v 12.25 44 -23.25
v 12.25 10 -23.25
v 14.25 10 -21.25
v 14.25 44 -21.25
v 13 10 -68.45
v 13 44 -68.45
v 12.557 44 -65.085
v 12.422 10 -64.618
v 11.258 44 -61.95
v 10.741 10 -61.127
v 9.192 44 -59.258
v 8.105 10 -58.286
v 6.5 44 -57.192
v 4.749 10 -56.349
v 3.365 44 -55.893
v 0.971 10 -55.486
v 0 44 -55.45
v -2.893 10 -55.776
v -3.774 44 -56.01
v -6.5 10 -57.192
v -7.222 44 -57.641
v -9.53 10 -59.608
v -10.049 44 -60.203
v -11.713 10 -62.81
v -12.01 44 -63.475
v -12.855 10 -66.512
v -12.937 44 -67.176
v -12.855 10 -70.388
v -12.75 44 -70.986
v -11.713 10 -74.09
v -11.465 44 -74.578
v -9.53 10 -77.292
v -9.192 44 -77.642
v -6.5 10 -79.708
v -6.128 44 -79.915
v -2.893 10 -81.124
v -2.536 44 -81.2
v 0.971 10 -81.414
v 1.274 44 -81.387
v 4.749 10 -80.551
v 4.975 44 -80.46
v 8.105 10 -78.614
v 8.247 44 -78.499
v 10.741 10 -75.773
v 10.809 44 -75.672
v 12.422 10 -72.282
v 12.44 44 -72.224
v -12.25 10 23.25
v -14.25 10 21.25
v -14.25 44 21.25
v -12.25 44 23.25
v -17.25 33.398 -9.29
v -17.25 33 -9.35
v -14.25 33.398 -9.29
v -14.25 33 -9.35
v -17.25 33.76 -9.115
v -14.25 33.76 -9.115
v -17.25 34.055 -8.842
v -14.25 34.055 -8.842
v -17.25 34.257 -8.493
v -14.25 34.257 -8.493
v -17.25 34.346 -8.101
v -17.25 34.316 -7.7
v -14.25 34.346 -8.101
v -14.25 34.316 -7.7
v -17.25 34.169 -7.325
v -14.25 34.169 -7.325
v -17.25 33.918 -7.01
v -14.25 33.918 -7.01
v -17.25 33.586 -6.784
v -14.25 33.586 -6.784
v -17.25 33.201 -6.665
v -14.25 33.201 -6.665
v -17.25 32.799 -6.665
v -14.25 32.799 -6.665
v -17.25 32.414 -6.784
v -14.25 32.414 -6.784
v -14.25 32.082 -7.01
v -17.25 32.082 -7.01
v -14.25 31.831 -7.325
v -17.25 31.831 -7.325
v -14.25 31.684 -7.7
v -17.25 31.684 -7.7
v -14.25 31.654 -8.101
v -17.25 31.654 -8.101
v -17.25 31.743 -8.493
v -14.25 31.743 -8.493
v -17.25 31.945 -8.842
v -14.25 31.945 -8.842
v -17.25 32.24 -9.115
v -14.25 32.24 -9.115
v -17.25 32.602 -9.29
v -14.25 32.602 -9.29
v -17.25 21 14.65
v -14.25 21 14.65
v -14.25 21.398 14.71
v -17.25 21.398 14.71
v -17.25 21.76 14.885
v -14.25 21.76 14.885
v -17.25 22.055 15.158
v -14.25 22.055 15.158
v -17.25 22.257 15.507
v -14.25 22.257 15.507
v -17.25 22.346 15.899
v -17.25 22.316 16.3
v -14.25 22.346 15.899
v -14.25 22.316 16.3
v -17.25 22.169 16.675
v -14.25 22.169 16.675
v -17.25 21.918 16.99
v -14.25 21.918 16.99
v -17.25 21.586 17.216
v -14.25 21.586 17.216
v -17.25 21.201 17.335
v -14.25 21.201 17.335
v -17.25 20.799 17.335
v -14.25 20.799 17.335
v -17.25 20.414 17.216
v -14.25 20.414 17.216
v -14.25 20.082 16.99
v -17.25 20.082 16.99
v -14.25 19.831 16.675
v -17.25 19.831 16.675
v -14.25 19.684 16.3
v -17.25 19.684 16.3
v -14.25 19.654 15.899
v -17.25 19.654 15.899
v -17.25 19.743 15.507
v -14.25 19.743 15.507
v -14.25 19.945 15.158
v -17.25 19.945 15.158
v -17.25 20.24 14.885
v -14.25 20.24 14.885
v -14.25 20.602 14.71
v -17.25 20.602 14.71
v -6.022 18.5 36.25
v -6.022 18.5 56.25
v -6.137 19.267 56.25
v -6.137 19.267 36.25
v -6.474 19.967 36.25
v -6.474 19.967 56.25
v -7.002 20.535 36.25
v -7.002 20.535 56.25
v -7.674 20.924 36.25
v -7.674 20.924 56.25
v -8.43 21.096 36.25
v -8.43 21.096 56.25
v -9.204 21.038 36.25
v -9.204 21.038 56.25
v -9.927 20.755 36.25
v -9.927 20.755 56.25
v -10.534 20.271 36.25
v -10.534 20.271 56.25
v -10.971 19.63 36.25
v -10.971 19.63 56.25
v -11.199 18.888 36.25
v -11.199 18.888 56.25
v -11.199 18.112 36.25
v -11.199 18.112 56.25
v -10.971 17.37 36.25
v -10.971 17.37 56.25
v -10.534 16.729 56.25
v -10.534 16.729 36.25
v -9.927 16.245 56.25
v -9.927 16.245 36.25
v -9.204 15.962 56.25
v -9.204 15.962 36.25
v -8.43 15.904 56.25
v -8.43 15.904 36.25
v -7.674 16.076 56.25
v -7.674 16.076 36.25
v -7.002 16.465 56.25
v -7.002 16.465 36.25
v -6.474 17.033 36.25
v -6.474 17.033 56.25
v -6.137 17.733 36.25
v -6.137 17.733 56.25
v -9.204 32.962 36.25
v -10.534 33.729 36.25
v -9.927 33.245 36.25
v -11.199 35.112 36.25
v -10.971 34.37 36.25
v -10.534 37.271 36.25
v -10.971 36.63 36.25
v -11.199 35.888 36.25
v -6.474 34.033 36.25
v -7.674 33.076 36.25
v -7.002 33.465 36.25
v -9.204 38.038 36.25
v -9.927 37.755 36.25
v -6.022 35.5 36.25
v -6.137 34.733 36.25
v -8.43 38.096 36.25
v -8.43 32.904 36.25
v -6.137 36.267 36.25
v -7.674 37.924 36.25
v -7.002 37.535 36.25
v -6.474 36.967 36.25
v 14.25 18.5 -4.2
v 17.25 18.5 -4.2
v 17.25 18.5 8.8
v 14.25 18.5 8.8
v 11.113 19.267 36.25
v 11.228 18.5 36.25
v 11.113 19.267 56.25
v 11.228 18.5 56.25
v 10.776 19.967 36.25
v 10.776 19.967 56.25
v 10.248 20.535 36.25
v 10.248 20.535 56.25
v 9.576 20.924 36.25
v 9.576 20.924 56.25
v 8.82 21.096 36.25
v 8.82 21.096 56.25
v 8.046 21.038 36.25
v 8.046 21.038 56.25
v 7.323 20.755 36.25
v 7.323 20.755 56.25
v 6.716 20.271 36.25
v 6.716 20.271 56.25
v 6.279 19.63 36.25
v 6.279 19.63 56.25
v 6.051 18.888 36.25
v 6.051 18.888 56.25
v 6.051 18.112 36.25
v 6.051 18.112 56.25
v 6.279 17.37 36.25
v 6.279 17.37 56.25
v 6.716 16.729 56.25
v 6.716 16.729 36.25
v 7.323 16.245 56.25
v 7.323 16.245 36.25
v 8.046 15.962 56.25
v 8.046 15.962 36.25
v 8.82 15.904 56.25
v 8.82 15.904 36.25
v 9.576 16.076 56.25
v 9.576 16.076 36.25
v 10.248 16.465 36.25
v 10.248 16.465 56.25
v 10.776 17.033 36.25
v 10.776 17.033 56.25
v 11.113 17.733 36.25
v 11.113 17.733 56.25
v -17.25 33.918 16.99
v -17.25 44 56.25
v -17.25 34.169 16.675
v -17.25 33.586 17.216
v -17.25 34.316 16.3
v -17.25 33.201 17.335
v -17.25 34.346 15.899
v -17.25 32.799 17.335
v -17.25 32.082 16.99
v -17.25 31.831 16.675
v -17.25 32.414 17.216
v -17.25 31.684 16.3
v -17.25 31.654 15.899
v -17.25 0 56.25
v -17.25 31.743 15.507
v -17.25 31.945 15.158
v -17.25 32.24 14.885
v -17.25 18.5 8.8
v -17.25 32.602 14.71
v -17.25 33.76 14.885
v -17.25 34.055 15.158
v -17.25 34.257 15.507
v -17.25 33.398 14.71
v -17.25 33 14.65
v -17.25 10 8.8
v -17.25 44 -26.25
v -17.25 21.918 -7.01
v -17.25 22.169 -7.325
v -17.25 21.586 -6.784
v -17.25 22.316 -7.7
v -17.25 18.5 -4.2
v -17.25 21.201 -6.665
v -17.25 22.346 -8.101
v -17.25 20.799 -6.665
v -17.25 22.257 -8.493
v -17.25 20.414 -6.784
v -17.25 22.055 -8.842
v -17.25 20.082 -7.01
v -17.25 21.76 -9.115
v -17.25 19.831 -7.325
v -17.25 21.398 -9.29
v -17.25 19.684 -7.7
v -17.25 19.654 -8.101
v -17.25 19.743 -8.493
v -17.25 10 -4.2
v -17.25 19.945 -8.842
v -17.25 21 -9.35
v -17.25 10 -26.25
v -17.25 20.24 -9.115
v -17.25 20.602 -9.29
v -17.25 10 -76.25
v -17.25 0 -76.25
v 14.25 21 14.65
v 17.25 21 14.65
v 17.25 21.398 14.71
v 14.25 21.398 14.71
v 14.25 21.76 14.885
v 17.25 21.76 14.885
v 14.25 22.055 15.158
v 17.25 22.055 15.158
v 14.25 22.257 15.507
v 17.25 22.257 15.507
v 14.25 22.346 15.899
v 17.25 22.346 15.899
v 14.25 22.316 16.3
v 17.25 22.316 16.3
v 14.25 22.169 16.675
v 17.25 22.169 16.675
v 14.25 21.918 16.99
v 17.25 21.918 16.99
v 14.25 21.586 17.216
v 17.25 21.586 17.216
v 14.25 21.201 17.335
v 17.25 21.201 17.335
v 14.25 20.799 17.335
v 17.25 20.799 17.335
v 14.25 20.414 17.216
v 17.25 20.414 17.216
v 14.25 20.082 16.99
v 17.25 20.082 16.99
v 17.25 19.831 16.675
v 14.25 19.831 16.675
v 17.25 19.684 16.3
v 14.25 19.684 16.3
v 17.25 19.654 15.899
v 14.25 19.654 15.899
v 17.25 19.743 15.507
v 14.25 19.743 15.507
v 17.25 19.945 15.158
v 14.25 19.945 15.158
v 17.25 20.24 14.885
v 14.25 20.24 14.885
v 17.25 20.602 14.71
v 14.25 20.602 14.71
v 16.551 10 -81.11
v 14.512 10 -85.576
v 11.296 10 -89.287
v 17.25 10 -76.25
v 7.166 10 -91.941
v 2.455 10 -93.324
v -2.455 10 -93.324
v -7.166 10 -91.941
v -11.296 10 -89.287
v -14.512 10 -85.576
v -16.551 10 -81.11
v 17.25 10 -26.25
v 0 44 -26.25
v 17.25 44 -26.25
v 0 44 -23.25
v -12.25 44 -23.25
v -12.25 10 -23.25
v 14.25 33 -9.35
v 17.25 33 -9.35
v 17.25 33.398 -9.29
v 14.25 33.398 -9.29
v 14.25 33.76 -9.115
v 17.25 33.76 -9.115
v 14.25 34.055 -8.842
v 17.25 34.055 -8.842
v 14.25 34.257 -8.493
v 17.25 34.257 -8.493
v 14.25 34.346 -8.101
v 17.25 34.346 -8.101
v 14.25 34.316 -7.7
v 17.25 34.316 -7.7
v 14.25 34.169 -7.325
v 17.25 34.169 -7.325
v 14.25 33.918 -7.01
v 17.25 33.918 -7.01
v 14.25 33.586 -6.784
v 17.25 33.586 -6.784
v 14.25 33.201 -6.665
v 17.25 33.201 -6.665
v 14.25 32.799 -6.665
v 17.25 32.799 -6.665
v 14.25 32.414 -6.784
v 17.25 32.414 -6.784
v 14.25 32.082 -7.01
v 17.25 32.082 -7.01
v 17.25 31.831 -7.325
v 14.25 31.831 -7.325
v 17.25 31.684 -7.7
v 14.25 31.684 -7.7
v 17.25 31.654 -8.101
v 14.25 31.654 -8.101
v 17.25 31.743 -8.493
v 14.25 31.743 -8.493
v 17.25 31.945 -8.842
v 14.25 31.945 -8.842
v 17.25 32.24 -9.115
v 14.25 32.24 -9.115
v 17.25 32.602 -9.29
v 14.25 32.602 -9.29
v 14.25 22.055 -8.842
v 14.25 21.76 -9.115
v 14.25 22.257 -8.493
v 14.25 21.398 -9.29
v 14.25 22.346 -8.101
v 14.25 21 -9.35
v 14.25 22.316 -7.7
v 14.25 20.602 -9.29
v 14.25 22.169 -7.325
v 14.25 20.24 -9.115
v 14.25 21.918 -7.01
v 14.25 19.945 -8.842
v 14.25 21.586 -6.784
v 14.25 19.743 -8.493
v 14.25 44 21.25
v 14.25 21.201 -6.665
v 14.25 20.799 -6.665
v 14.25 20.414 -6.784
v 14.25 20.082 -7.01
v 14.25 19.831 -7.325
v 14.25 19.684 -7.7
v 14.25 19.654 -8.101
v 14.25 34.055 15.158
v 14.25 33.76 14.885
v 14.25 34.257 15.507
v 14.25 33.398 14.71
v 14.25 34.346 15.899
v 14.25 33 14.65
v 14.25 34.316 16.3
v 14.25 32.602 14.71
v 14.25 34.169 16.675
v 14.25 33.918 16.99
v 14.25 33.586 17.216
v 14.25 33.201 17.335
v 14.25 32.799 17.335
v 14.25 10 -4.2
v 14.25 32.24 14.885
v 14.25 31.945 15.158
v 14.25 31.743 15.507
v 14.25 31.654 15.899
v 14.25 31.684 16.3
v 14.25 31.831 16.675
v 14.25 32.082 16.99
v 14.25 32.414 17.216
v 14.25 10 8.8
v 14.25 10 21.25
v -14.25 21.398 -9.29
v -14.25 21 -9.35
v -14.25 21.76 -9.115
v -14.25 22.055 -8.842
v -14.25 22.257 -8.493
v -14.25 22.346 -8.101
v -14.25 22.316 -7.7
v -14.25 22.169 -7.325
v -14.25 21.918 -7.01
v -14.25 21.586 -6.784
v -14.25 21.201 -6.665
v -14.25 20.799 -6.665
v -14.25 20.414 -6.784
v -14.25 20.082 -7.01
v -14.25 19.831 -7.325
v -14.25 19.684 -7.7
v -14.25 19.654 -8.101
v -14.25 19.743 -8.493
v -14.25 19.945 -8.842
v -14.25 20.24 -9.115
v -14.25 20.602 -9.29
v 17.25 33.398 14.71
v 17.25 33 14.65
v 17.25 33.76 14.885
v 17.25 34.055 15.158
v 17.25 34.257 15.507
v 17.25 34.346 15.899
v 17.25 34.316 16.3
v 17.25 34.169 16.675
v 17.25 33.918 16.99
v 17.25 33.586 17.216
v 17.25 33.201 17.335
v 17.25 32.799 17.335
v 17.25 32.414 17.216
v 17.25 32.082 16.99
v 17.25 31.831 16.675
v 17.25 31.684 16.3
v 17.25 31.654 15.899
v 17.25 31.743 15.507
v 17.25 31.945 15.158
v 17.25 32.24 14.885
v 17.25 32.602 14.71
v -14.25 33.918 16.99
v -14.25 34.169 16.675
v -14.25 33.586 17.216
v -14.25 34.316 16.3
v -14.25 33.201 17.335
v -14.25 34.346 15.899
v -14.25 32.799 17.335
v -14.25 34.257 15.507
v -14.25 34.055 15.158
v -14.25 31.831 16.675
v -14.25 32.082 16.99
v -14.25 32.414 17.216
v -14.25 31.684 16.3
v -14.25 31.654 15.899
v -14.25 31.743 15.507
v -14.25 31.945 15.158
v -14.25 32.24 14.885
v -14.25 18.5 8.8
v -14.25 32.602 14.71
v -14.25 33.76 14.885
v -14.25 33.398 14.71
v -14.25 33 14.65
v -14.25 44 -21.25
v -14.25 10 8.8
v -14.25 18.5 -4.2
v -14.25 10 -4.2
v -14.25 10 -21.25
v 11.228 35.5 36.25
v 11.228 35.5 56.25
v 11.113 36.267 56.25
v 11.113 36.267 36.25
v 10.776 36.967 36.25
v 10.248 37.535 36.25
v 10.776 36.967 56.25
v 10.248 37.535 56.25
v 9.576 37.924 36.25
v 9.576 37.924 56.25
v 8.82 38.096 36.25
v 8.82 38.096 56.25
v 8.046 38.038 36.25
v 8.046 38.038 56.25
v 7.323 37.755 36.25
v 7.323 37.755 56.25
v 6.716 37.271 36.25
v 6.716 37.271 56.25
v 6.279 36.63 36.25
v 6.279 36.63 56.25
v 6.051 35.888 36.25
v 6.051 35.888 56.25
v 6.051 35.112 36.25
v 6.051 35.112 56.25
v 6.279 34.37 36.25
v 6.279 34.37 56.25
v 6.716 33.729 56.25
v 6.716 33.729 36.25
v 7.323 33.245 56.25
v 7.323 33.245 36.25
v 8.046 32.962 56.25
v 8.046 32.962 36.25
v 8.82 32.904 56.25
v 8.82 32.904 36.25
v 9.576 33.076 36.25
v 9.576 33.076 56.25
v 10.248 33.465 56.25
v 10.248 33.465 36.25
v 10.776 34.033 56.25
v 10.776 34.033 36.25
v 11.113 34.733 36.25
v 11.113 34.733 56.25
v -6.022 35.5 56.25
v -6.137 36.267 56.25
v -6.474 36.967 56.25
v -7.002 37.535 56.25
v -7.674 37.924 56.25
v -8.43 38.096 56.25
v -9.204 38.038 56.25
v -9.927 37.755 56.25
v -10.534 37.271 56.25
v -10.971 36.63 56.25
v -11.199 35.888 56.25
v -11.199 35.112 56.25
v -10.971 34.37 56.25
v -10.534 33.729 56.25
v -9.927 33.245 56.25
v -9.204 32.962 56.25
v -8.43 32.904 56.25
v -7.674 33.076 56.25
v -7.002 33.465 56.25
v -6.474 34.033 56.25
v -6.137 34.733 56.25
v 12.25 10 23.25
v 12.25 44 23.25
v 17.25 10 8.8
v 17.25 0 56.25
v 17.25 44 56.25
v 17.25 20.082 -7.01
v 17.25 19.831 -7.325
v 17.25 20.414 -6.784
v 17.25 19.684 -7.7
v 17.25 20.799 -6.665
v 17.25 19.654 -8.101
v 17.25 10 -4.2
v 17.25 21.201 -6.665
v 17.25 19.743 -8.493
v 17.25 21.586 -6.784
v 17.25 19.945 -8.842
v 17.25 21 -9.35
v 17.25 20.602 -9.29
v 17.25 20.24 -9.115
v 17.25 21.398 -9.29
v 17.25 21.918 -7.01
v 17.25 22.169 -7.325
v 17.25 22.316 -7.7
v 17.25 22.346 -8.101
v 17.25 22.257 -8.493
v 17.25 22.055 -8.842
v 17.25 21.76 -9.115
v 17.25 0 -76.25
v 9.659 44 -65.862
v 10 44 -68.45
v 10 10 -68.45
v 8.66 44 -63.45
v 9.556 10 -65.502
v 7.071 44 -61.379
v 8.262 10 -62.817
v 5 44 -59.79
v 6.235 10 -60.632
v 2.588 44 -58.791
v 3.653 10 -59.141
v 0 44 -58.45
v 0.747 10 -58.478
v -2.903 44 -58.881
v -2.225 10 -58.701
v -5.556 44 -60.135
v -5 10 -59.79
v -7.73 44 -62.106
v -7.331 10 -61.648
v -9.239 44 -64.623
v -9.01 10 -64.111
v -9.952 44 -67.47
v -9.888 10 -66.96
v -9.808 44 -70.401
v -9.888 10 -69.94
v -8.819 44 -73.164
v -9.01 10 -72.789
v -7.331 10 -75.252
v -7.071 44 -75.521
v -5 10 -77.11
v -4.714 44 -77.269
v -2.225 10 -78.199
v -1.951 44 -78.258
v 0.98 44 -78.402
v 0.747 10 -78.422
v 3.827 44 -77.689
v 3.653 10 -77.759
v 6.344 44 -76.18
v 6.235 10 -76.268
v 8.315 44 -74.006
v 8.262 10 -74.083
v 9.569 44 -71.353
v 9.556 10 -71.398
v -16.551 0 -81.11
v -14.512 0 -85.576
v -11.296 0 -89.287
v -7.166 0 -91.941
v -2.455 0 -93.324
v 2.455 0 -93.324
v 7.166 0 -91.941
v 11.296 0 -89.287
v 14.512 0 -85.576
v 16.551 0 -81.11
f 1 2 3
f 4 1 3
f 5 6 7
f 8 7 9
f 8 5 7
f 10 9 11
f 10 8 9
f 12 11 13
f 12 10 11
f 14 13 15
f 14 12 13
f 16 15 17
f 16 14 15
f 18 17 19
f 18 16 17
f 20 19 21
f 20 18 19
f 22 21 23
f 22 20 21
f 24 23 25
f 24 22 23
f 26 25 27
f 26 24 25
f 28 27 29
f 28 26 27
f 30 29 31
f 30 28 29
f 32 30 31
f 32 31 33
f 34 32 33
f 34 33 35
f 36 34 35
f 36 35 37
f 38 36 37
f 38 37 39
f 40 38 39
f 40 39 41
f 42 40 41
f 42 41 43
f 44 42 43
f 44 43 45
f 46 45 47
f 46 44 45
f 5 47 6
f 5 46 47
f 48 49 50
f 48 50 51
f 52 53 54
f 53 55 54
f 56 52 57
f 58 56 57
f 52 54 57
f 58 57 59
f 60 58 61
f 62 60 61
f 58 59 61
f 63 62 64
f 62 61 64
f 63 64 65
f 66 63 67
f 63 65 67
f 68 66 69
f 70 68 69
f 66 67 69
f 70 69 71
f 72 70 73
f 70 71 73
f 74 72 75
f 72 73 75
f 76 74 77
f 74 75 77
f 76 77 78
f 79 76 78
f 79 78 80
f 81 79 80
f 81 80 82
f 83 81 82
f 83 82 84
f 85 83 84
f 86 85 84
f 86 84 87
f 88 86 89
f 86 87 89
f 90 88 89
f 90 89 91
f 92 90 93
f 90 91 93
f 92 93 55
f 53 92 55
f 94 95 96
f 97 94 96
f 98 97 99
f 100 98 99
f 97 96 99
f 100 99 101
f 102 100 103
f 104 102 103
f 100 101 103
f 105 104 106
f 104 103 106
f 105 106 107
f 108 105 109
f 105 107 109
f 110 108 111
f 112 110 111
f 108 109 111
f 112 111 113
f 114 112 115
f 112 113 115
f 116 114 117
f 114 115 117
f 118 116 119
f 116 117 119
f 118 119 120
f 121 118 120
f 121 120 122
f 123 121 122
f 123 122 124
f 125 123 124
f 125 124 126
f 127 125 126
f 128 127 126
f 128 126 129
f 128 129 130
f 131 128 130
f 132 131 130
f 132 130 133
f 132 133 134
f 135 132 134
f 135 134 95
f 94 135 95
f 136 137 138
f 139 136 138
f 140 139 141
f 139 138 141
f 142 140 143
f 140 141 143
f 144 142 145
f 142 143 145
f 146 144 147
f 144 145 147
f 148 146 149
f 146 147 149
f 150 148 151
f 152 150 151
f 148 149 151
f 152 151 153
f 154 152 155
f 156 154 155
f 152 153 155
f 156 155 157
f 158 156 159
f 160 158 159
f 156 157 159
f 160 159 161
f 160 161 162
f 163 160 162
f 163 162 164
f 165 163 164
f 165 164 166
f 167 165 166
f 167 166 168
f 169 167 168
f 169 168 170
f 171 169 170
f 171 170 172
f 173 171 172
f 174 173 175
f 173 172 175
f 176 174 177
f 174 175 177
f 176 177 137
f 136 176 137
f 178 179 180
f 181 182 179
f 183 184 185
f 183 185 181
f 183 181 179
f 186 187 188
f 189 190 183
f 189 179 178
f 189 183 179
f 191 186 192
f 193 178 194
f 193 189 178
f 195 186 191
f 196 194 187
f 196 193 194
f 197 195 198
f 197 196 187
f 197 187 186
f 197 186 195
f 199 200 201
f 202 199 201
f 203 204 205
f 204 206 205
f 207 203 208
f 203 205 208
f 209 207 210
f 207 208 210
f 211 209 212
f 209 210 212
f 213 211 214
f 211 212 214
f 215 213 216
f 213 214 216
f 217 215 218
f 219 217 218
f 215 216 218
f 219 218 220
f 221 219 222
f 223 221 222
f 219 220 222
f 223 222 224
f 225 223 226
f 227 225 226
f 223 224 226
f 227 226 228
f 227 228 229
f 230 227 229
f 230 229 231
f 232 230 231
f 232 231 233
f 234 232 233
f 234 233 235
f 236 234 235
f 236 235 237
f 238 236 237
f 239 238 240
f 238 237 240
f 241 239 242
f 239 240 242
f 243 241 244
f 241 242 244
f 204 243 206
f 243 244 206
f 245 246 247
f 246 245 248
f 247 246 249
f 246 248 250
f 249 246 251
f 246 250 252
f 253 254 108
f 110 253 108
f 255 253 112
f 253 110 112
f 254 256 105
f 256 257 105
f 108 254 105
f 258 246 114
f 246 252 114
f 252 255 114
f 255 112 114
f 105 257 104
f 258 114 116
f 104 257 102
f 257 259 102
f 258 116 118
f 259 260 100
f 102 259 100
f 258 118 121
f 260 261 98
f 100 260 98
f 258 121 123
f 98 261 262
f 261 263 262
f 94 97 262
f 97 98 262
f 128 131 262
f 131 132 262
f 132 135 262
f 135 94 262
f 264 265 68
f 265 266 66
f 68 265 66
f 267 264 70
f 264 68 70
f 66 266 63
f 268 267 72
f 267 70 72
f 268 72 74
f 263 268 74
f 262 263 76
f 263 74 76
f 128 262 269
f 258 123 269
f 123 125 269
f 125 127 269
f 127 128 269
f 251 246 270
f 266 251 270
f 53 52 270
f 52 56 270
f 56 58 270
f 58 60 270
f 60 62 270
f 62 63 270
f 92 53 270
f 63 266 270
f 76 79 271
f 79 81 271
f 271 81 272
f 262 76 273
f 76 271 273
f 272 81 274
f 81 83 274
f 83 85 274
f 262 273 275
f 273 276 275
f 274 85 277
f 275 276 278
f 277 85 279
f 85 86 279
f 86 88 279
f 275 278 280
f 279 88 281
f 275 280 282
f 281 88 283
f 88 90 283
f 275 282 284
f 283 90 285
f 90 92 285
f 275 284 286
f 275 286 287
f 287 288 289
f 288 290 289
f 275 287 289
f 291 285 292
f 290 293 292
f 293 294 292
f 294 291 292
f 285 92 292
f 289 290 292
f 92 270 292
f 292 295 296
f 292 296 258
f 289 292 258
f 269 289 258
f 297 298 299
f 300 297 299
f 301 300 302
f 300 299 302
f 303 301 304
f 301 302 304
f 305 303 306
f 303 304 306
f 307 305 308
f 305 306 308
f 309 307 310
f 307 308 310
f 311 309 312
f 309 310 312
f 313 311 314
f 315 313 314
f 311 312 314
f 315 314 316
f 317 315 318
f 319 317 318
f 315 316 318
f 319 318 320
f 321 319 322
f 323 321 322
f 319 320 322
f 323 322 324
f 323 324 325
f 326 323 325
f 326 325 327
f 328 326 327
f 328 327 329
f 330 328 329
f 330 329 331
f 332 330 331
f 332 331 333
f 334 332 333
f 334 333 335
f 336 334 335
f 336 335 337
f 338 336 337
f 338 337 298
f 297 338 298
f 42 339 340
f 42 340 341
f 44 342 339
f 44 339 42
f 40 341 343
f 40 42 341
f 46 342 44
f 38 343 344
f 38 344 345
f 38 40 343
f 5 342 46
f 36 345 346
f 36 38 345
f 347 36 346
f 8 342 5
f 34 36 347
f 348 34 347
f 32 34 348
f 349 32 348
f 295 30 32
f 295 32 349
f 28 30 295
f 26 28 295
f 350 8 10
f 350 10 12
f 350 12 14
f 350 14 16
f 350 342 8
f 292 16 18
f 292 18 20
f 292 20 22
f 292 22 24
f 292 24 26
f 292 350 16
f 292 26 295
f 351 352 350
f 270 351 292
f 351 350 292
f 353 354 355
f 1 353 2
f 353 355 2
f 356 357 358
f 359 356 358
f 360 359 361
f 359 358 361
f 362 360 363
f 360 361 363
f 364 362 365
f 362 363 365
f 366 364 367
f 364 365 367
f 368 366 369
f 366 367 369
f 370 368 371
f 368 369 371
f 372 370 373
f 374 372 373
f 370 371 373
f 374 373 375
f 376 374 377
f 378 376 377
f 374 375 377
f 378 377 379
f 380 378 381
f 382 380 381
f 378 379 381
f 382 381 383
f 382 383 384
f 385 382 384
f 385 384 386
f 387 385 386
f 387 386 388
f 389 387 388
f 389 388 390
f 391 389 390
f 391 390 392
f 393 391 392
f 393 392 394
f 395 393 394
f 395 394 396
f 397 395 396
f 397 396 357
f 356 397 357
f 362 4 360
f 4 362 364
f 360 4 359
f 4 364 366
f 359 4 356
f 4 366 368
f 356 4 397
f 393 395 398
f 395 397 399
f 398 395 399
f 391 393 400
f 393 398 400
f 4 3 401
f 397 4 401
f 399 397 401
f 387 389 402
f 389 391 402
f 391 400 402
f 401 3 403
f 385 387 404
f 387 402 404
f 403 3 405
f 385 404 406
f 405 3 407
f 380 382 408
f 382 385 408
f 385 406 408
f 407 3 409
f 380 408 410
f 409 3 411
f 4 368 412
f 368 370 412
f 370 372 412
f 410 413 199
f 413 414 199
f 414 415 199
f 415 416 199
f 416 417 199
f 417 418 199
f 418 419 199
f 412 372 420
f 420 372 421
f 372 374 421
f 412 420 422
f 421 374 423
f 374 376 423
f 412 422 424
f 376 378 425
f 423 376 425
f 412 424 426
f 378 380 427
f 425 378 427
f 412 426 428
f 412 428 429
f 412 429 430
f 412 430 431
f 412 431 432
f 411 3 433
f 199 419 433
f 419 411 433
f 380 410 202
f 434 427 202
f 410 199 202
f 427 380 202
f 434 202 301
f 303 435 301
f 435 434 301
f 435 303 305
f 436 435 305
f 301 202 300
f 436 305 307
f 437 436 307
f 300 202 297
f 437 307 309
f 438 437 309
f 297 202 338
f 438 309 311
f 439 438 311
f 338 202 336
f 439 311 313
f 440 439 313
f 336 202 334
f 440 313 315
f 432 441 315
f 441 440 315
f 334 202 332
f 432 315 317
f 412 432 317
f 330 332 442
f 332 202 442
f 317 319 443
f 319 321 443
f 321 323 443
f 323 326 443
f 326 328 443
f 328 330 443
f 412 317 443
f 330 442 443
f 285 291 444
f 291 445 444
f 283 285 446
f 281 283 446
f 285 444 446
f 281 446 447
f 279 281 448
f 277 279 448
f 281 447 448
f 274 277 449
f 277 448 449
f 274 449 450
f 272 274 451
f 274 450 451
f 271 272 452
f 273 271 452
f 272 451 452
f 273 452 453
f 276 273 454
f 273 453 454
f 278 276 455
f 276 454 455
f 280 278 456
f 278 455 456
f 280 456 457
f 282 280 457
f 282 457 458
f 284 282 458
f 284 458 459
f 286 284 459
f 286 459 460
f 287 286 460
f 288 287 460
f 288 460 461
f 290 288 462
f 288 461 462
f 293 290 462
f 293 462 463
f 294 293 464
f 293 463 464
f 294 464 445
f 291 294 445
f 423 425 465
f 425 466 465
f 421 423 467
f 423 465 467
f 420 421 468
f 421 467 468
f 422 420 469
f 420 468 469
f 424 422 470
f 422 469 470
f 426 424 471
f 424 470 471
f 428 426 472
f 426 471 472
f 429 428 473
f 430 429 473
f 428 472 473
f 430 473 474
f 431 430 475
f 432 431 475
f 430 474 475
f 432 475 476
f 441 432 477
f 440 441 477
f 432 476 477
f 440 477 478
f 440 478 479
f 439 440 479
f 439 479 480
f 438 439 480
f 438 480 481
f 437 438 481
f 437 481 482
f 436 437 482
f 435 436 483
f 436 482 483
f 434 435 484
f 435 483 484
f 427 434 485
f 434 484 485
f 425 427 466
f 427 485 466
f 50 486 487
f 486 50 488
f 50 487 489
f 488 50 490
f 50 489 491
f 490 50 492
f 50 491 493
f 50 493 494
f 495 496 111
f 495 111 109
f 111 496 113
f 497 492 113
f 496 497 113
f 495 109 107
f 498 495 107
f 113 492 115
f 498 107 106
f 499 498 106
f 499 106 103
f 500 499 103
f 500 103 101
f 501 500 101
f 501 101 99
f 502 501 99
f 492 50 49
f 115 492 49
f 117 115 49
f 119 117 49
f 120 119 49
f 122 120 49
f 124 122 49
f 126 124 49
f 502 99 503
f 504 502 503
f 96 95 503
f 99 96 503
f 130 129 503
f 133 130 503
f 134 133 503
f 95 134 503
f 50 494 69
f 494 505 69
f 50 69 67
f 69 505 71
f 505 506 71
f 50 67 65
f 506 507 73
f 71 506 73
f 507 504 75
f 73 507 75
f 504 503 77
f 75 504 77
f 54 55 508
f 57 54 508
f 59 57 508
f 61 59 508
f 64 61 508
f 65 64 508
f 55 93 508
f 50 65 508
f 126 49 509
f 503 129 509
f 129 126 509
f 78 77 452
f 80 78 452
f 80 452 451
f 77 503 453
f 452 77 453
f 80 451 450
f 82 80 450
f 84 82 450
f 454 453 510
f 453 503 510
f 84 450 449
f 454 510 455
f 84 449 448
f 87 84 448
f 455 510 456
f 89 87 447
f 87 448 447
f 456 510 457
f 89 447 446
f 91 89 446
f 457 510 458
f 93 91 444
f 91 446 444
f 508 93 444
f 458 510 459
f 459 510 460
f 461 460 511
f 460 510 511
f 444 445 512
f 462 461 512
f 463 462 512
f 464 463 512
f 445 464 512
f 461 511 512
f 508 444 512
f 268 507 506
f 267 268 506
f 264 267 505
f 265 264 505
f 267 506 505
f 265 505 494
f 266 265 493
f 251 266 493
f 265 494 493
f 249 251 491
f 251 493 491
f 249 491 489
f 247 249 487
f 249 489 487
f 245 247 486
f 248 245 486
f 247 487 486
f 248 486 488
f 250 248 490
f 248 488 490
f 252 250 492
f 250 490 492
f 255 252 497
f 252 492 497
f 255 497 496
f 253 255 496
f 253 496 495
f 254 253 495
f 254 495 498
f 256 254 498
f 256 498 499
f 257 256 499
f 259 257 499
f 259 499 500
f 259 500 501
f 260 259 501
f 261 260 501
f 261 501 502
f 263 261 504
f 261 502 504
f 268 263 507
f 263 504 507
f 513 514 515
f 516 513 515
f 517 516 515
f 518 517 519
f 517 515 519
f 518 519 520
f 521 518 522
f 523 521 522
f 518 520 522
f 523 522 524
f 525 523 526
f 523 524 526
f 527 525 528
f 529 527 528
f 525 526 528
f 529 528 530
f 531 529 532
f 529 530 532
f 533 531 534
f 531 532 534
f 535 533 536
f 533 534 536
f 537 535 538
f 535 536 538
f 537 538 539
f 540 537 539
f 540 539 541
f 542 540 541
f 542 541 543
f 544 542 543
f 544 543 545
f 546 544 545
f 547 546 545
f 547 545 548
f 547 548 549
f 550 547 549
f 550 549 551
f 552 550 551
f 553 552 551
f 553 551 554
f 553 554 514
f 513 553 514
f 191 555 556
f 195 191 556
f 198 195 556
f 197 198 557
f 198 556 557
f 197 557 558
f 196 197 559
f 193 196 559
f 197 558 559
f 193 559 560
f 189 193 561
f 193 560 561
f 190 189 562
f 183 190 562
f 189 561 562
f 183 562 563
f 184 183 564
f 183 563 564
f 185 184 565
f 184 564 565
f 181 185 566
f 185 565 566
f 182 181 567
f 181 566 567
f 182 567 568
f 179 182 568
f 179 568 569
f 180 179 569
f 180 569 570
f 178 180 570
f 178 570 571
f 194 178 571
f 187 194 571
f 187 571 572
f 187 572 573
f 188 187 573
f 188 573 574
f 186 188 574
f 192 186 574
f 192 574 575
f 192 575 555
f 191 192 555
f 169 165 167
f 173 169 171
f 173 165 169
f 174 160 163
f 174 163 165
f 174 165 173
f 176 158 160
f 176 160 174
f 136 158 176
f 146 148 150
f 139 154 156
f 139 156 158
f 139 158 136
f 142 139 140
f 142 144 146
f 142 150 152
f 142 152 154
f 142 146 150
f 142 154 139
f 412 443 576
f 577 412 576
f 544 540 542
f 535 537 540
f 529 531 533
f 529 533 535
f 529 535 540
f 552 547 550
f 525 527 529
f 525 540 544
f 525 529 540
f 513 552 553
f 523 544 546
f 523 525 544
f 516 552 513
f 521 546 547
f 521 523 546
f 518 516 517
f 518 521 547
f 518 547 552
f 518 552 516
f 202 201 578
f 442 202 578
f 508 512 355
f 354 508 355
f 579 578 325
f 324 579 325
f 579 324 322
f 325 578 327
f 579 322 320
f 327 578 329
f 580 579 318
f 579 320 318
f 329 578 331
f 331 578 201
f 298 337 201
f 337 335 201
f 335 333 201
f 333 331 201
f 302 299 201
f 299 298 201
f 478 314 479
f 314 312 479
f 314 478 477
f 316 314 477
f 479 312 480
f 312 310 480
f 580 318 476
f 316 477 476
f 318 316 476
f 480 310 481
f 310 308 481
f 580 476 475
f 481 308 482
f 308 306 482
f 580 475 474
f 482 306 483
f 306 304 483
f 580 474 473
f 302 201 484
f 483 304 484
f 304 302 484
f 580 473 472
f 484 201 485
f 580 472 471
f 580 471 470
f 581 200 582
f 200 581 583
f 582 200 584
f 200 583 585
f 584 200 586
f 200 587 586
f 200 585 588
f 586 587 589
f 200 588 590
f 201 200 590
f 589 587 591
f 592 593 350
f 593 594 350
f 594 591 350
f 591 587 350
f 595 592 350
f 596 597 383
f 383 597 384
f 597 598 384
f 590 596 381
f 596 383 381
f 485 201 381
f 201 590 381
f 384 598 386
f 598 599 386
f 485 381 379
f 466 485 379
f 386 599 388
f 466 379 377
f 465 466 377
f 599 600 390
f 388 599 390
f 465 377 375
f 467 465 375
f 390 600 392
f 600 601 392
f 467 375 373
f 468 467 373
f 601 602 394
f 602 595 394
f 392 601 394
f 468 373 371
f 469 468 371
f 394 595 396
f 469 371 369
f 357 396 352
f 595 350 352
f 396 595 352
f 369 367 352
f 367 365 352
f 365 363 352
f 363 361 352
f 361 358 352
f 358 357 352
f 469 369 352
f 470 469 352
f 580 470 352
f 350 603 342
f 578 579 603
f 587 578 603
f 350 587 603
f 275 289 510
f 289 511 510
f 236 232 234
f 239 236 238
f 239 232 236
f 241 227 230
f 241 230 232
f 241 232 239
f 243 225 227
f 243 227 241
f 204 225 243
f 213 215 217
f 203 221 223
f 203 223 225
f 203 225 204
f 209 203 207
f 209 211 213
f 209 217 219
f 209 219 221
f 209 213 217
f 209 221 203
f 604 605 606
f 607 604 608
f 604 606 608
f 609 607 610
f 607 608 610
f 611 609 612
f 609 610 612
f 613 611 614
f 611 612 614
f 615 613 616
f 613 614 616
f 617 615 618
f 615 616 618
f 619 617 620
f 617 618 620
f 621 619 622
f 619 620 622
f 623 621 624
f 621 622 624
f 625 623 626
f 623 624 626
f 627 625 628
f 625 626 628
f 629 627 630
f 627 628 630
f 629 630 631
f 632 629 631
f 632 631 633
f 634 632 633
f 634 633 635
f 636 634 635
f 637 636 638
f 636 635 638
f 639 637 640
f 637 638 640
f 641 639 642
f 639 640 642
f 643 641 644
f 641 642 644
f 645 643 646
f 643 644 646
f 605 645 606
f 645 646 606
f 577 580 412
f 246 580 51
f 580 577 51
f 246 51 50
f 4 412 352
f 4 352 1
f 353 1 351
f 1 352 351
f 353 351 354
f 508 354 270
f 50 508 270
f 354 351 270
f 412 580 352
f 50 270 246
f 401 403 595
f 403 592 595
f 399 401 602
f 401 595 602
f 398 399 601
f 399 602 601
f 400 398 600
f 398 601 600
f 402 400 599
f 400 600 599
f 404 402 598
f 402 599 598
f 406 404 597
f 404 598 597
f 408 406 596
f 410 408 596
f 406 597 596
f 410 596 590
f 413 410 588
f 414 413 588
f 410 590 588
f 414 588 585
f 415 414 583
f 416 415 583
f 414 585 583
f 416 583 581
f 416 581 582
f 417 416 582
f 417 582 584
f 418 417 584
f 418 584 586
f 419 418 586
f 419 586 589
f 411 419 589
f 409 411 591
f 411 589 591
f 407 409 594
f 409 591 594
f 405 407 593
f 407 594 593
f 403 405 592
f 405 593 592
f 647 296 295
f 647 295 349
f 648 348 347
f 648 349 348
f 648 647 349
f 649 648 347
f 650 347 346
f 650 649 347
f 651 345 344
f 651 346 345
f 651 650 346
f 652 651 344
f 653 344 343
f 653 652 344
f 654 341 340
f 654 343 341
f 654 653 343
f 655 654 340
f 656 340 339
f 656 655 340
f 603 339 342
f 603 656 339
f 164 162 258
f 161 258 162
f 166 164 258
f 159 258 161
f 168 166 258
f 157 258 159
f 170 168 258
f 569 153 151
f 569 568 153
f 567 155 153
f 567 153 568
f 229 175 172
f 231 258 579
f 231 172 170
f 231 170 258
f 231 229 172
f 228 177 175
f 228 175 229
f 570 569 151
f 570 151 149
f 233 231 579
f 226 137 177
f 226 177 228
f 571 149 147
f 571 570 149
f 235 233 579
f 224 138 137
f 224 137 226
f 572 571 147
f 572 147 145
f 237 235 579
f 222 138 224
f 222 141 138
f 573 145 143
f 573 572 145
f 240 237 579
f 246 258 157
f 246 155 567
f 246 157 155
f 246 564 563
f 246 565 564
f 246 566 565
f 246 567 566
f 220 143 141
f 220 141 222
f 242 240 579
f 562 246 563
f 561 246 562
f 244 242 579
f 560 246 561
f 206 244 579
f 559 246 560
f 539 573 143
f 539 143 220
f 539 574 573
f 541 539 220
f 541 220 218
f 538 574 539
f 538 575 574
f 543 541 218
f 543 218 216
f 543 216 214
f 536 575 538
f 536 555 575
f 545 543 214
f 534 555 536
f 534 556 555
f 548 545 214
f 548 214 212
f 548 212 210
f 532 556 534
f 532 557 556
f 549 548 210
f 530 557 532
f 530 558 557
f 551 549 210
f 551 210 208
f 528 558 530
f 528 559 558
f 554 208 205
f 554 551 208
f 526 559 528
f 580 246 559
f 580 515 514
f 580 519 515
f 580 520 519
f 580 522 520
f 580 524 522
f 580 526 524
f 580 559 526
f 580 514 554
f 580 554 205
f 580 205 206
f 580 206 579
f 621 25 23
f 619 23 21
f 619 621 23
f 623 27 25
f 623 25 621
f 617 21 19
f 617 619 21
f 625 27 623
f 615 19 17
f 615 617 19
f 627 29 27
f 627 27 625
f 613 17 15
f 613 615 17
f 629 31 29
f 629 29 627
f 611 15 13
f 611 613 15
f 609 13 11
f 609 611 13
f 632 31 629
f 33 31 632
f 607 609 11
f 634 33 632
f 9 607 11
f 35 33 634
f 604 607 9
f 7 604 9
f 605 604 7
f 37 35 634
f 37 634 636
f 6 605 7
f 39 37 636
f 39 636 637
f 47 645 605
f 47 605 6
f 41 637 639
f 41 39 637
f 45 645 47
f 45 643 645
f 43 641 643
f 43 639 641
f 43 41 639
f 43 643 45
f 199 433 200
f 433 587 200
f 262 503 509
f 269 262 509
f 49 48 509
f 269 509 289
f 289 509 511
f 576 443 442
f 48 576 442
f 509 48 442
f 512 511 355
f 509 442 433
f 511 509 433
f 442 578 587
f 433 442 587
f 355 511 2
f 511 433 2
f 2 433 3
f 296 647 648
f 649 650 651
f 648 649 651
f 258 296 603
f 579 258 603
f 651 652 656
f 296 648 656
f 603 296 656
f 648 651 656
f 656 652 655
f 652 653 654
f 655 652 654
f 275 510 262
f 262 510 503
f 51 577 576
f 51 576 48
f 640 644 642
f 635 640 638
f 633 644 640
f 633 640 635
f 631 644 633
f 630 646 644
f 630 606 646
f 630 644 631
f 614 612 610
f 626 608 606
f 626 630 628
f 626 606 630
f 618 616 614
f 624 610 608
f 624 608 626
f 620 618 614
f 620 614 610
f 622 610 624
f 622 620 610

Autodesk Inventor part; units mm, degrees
ref_plane "YZ Plane" through (0, 0, 0) normal (1, 0, 0) x (0, 1, 0)
ref_plane "XZ Plane" through (0, 0, 0) normal (0, 1, 0) x (-1, 0, 0)
ref_plane "XY Plane" through (0, 0, 0) normal (0, 0, 1) x (1, 0, 0)
sketch "Sketch1" plane through (0, 0, 0) normal (0, 1, 0) x (-1, 0, 0)
  line L0 (-17.25, 26.25) -> (17.25, 26.25)
  line L1 (17.25, 26.25) -> (17.25, -26.25)
  line L2 (17.25, -26.25) -> (-17.25, -26.25)
  line L3 (-17.25, -26.25) -> (-17.25, 26.25)
  line L4 (-17.25, 26.25) -> (17.25, -26.25) construction
  line L5 (17.25, 26.25) -> (-17.25, -26.25) construction
  line L6 (17.25, -26.25) -> (-17.25, -26.25)
  line L7 (-17.25, -26.25) -> (-17.25, -76.25)
  line L8 (-17.25, -76.25) -> (17.25, -76.25)
  line L9 (17.25, -76.25) -> (17.25, -26.25)
  arc A0 (-17.25, -76.25) -> (17.25, -76.25) centre (0, -76.25) ccw
  point P0 (0, 0)
  dimension "d0" = 34.5
  dimension "d1" = 52.5
  dimension "d4" = 50
extrude "Floor" add sketch "Sketch1" along normal blind 10
sketch "Sketch3" plane through (0, 10, 0) normal (0, 1, 0) x (1, 0, 0)
  arc A0 (17.25, 76.25) -> (-17.25, 76.25) centre (0, 76.25) ccw
  circle A1 centre (0, 68.45) radius 10
  circle A2 centre (0, 68.45) radius 13
  line L0 (14.25, -23.25) -> (-14.25, -23.25)
  line L1 (-14.25, -23.25) -> (-14.25, 23.25)
  line L2 (-14.25, 23.25) -> (14.25, 23.25)
  line L3 (14.25, 23.25) -> (14.25, -23.25)
  line L4 (14.25, -23.25) -> (-14.25, 23.25) construction
  line L5 (-14.25, -23.25) -> (14.25, 23.25) construction
  line L6 (17.25, 26.25) -> (-17.25, 26.25)
  line L7 (-17.25, 26.25) -> (-17.25, -26.25)
  line L8 (-17.25, -26.25) -> (17.25, -26.25)
  line L9 (17.25, -26.25) -> (17.25, 26.25)
  line L10 (17.25, 26.25) -> (-17.25, -26.25) construction
  line L11 (-17.25, 26.25) -> (17.25, -26.25) construction
  line L12 (0, 23.25) -> (0, 68.45)
  point P0 (0, 0)
  dimension "d14" = 20
  dimension "d18" = 28.5
  dimension "d19" = 46.5
  dimension "d38" = 45.2
  dimension "d54" = 26
extrude "Slots" add sketch "Sketch3" along normal blind 34
sketch "Sketch4" plane through (17.25, 0, 26.25) normal (1, 0, 0) x (0, 0, -1)
  line L0 (3, 10) -> (49.5, 10)
  line L1 (49.5, 10) -> (49.5, 44)
  line L2 (49.5, 44) -> (3, 44)
  line L3 (3, 44) -> (3, 10)
  line L4 (26.25, 10) -> (38.25, 10)
  line L5 (3, 10) -> (49.5, 10) projected
  line L6 (38.25, 10) -> (14.25, 10)
  line L7 (10.25, 33) -> (34.25, 33)
  line L8 (34.25, 33) -> (34.25, 21)
  line L9 (34.25, 21) -> (10.25, 21)
  line L10 (10.25, 21) -> (10.25, 33)
  line L11 (10.25, 33) -> (34.25, 21) construction
  line L12 (34.25, 33) -> (10.25, 21) construction
  circle A0 centre (10.25, 33) radius 1.35
  circle A1 centre (34.25, 33) radius 1.35
  circle A2 centre (34.25, 21) radius 1.35
  circle A3 centre (10.25, 21) radius 1.35
  line L13 (49.5, 10) -> (49.5, 44) projected
  line L14 (49.5, 27) -> (34.25, 27)
  line L15 (34.25, 27) -> (22.25, 27)
  point P0 (26.25, 0)
  point P1 (22.25, 27)
  dimension "d0" = 34.5
  dimension "d24" = 12
  dimension "d25" = 24
  dimension "d26" = 2.7
  dimension "d27" = 2.7
  dimension "d28" = 2.7
  dimension "d29" = 2.7
  dimension "d56" = 15.25
  dimension "d57" = 12
extrude "Screws/Sides" cut sketch "Sketch4" against normal through all contours A1 L7 L8 | L8 L7 A1 | A2 L9 L8 | L8 L9 A2 | A0 L10 L7 | L7 L10 A0 | A3 L10 L9 | L9 L10 A3
sketch "Sketch5" plane through (0, 44, 0) normal (0, 1, 0) x (1, 0, 0)
  line L0 (14.25, -21.25) -> (-14.25, -21.25)
  line L1 (-14.25, -21.25) -> (-14.25, 21.25)
  line L2 (-14.25, 21.25) -> (14.25, 21.25)
  line L3 (14.25, 21.25) -> (14.25, -21.25)
  line L4 (14.25, -21.25) -> (-14.25, 21.25) construction
  line L5 (-14.25, -21.25) -> (14.25, 21.25) construction
  line L6 (12.25, 23.25) -> (-12.25, 23.25)
  line L7 (-12.25, 23.25) -> (-12.25, -23.25)
  line L8 (-12.25, -23.25) -> (12.25, -23.25)
  line L9 (12.25, -23.25) -> (12.25, 23.25)
  line L10 (12.25, 23.25) -> (-12.25, -23.25) construction
  line L11 (-12.25, 23.25) -> (12.25, -23.25) construction
  line L12 (-12.25, 21.25) -> (-14.25, 21.25)
  line L13 (12.25, 23.25) -> (12.25, 21.25)
  line L14 (12.25, -21.25) -> (14.25, -21.25)
  line L15 (12.25, -23.25) -> (12.25, -21.25)
  line L16 (-14.25, -21.25) -> (-14.25, -23.25)
  line L17 (-14.25, -23.25) -> (-12.25, -23.25)
  line L18 (-14.25, -21.25) -> (-12.25, -23.25)
  line L19 (-14.25, -23.25) -> (-14.25, -21.25)
  line L20 (-14.25, 21.25) -> (-12.25, 23.25)
  line L21 (-14.25, 23.25) -> (-14.25, 21.25)
  line L22 (-14.25, -23.25) -> (-14.25, 23.25) projected
  line L23 (12.25, 23.25) -> (14.25, 23.25)
  line L24 (14.25, 23.25) -> (14.25, 21.25)
  line L25 (12.25, 23.25) -> (14.25, 21.25)
  line L26 (14.25, 23.25) -> (12.25, 23.25)
  line L27 (14.25, -23.25) -> (12.25, -23.25)
  line L28 (14.25, -23.25) -> (-14.25, -23.25) projected
  line L29 (14.25, -21.25) -> (12.25, -23.25)
  line L30 (14.25, -23.25) -> (14.25, -21.25)
  line L31 (14.25, 23.25) -> (14.25, -23.25) projected
  line L32 (-14.25, 23.25) -> (-12.25, 23.25)
  line L33 (14.25, 23.25) -> (-14.25, 23.25) projected
  point P0 (0, 0)
  dimension "d32" = 42.5
  dimension "d33" = 24.5
extrude "Servo Corners" add sketch "Sketch5" against normal blind 34 contours L30 L27 L29 | L25 L23 L24 | L17 L16 L18 | L20 L21 L32
sketch "Sketch6" plane through (0, 44, 0) normal (0, 1, 0) x (1, 0, 0)
  line L0 (-12.25, 23.25) -> (12.25, 23.25) projected
  line L1 (0, 23.25) -> (0, 12)
  circle A0 centre (0, 68.45) radius 10 projected
  line L2 (0, 12) -> (0, 68.45)
  point P0 (0, 0)
  dimension "d36" = 11.25
  dimension "d37" = 56.45
sketch "Sketch7" plane through (-17.25, 0, 26.25) normal (0, 0, 1) x (1, 0, 0)
  line L0 (0, 0) -> (34.5, 0)
  line L1 (34.5, 0) -> (34.5, 44)
  line L2 (34.5, 44) -> (0, 44)
  line L3 (0, 44) -> (0, 0)
  point P0 (17.25, 0)
extrude "Mount Extension" add sketch "Sketch7" along normal blind 30
sketch "Sketch8" plane through (-17.25, 0, 56.25) normal (0, 0, 1) x (1, 0, 0)
  line L0 (17.25, 0) -> (17.25, 10)
  line L1 (29.5, 44) -> (5, 44) projected
  line L2 (17.25, 27) -> (17.25, 35.5)
  line L3 (34.5, 10) -> (34.5, 44) projected
  line L4 (0, 10) -> (0, 44) projected
  line L5 (17.25, 35.5) -> (8.625, 35.5)
  circle A0 centre (8.625, 35.5) radius 2.6035
  line L6 (17.25, 10) -> (8.625, 10)
  line L7 (29.5, 10) -> (5, 10) projected
  line L8 (8.625, 10) -> (8.625, 18.5)
  circle A1 centre (8.625, 18.5) radius 2.6035
  line L9 (34.5, 35.5) -> (25.875, 35.5)
  dimension "d41" = 10
  dimension "d42" = 5.207
  dimension "d43" = 8.5
  dimension "d44" = 5.207
  dimension "d47" = 8.625
extrude "Mount Holes" cut sketch "Sketch8" against normal blind 20
pattern_linear "Rectangular Pattern1" count 2 spacing 17.25 along (1, 0, 0) of "Mount Holes"
sketch "Sketch11" plane through (17.25, 0, -76.25) normal (1, 0, 0) x (0, 0, -1)
  line L0 (-85.05, 10) -> (-72.05, 10)
  line L1 (-72.05, 10) -> (-72.05, 18.5)
  line L2 (-72.05, 18.5) -> (-85.05, 18.5)
  line L3 (-85.05, 18.5) -> (-85.05, 10)
  circle A0 centre (-68.25, 21) radius 1.35 projected
  line L4 (-68.25, 21) -> (-68.25, 10)
  line L5 (-97.5, 10) -> (-55, 10) projected
  line L6 (-68.25, 10) -> (-72.05, 10)
  point P0 (-76.25, 0)
  dimension "d58" = 13
  dimension "d59" = 8.5
  dimension "d60" = 3.8
extrude "Wiring Holes" cut sketch "Sketch11" against normal through all contours L3 L2 L1 L0
properties part number "JointBase"
